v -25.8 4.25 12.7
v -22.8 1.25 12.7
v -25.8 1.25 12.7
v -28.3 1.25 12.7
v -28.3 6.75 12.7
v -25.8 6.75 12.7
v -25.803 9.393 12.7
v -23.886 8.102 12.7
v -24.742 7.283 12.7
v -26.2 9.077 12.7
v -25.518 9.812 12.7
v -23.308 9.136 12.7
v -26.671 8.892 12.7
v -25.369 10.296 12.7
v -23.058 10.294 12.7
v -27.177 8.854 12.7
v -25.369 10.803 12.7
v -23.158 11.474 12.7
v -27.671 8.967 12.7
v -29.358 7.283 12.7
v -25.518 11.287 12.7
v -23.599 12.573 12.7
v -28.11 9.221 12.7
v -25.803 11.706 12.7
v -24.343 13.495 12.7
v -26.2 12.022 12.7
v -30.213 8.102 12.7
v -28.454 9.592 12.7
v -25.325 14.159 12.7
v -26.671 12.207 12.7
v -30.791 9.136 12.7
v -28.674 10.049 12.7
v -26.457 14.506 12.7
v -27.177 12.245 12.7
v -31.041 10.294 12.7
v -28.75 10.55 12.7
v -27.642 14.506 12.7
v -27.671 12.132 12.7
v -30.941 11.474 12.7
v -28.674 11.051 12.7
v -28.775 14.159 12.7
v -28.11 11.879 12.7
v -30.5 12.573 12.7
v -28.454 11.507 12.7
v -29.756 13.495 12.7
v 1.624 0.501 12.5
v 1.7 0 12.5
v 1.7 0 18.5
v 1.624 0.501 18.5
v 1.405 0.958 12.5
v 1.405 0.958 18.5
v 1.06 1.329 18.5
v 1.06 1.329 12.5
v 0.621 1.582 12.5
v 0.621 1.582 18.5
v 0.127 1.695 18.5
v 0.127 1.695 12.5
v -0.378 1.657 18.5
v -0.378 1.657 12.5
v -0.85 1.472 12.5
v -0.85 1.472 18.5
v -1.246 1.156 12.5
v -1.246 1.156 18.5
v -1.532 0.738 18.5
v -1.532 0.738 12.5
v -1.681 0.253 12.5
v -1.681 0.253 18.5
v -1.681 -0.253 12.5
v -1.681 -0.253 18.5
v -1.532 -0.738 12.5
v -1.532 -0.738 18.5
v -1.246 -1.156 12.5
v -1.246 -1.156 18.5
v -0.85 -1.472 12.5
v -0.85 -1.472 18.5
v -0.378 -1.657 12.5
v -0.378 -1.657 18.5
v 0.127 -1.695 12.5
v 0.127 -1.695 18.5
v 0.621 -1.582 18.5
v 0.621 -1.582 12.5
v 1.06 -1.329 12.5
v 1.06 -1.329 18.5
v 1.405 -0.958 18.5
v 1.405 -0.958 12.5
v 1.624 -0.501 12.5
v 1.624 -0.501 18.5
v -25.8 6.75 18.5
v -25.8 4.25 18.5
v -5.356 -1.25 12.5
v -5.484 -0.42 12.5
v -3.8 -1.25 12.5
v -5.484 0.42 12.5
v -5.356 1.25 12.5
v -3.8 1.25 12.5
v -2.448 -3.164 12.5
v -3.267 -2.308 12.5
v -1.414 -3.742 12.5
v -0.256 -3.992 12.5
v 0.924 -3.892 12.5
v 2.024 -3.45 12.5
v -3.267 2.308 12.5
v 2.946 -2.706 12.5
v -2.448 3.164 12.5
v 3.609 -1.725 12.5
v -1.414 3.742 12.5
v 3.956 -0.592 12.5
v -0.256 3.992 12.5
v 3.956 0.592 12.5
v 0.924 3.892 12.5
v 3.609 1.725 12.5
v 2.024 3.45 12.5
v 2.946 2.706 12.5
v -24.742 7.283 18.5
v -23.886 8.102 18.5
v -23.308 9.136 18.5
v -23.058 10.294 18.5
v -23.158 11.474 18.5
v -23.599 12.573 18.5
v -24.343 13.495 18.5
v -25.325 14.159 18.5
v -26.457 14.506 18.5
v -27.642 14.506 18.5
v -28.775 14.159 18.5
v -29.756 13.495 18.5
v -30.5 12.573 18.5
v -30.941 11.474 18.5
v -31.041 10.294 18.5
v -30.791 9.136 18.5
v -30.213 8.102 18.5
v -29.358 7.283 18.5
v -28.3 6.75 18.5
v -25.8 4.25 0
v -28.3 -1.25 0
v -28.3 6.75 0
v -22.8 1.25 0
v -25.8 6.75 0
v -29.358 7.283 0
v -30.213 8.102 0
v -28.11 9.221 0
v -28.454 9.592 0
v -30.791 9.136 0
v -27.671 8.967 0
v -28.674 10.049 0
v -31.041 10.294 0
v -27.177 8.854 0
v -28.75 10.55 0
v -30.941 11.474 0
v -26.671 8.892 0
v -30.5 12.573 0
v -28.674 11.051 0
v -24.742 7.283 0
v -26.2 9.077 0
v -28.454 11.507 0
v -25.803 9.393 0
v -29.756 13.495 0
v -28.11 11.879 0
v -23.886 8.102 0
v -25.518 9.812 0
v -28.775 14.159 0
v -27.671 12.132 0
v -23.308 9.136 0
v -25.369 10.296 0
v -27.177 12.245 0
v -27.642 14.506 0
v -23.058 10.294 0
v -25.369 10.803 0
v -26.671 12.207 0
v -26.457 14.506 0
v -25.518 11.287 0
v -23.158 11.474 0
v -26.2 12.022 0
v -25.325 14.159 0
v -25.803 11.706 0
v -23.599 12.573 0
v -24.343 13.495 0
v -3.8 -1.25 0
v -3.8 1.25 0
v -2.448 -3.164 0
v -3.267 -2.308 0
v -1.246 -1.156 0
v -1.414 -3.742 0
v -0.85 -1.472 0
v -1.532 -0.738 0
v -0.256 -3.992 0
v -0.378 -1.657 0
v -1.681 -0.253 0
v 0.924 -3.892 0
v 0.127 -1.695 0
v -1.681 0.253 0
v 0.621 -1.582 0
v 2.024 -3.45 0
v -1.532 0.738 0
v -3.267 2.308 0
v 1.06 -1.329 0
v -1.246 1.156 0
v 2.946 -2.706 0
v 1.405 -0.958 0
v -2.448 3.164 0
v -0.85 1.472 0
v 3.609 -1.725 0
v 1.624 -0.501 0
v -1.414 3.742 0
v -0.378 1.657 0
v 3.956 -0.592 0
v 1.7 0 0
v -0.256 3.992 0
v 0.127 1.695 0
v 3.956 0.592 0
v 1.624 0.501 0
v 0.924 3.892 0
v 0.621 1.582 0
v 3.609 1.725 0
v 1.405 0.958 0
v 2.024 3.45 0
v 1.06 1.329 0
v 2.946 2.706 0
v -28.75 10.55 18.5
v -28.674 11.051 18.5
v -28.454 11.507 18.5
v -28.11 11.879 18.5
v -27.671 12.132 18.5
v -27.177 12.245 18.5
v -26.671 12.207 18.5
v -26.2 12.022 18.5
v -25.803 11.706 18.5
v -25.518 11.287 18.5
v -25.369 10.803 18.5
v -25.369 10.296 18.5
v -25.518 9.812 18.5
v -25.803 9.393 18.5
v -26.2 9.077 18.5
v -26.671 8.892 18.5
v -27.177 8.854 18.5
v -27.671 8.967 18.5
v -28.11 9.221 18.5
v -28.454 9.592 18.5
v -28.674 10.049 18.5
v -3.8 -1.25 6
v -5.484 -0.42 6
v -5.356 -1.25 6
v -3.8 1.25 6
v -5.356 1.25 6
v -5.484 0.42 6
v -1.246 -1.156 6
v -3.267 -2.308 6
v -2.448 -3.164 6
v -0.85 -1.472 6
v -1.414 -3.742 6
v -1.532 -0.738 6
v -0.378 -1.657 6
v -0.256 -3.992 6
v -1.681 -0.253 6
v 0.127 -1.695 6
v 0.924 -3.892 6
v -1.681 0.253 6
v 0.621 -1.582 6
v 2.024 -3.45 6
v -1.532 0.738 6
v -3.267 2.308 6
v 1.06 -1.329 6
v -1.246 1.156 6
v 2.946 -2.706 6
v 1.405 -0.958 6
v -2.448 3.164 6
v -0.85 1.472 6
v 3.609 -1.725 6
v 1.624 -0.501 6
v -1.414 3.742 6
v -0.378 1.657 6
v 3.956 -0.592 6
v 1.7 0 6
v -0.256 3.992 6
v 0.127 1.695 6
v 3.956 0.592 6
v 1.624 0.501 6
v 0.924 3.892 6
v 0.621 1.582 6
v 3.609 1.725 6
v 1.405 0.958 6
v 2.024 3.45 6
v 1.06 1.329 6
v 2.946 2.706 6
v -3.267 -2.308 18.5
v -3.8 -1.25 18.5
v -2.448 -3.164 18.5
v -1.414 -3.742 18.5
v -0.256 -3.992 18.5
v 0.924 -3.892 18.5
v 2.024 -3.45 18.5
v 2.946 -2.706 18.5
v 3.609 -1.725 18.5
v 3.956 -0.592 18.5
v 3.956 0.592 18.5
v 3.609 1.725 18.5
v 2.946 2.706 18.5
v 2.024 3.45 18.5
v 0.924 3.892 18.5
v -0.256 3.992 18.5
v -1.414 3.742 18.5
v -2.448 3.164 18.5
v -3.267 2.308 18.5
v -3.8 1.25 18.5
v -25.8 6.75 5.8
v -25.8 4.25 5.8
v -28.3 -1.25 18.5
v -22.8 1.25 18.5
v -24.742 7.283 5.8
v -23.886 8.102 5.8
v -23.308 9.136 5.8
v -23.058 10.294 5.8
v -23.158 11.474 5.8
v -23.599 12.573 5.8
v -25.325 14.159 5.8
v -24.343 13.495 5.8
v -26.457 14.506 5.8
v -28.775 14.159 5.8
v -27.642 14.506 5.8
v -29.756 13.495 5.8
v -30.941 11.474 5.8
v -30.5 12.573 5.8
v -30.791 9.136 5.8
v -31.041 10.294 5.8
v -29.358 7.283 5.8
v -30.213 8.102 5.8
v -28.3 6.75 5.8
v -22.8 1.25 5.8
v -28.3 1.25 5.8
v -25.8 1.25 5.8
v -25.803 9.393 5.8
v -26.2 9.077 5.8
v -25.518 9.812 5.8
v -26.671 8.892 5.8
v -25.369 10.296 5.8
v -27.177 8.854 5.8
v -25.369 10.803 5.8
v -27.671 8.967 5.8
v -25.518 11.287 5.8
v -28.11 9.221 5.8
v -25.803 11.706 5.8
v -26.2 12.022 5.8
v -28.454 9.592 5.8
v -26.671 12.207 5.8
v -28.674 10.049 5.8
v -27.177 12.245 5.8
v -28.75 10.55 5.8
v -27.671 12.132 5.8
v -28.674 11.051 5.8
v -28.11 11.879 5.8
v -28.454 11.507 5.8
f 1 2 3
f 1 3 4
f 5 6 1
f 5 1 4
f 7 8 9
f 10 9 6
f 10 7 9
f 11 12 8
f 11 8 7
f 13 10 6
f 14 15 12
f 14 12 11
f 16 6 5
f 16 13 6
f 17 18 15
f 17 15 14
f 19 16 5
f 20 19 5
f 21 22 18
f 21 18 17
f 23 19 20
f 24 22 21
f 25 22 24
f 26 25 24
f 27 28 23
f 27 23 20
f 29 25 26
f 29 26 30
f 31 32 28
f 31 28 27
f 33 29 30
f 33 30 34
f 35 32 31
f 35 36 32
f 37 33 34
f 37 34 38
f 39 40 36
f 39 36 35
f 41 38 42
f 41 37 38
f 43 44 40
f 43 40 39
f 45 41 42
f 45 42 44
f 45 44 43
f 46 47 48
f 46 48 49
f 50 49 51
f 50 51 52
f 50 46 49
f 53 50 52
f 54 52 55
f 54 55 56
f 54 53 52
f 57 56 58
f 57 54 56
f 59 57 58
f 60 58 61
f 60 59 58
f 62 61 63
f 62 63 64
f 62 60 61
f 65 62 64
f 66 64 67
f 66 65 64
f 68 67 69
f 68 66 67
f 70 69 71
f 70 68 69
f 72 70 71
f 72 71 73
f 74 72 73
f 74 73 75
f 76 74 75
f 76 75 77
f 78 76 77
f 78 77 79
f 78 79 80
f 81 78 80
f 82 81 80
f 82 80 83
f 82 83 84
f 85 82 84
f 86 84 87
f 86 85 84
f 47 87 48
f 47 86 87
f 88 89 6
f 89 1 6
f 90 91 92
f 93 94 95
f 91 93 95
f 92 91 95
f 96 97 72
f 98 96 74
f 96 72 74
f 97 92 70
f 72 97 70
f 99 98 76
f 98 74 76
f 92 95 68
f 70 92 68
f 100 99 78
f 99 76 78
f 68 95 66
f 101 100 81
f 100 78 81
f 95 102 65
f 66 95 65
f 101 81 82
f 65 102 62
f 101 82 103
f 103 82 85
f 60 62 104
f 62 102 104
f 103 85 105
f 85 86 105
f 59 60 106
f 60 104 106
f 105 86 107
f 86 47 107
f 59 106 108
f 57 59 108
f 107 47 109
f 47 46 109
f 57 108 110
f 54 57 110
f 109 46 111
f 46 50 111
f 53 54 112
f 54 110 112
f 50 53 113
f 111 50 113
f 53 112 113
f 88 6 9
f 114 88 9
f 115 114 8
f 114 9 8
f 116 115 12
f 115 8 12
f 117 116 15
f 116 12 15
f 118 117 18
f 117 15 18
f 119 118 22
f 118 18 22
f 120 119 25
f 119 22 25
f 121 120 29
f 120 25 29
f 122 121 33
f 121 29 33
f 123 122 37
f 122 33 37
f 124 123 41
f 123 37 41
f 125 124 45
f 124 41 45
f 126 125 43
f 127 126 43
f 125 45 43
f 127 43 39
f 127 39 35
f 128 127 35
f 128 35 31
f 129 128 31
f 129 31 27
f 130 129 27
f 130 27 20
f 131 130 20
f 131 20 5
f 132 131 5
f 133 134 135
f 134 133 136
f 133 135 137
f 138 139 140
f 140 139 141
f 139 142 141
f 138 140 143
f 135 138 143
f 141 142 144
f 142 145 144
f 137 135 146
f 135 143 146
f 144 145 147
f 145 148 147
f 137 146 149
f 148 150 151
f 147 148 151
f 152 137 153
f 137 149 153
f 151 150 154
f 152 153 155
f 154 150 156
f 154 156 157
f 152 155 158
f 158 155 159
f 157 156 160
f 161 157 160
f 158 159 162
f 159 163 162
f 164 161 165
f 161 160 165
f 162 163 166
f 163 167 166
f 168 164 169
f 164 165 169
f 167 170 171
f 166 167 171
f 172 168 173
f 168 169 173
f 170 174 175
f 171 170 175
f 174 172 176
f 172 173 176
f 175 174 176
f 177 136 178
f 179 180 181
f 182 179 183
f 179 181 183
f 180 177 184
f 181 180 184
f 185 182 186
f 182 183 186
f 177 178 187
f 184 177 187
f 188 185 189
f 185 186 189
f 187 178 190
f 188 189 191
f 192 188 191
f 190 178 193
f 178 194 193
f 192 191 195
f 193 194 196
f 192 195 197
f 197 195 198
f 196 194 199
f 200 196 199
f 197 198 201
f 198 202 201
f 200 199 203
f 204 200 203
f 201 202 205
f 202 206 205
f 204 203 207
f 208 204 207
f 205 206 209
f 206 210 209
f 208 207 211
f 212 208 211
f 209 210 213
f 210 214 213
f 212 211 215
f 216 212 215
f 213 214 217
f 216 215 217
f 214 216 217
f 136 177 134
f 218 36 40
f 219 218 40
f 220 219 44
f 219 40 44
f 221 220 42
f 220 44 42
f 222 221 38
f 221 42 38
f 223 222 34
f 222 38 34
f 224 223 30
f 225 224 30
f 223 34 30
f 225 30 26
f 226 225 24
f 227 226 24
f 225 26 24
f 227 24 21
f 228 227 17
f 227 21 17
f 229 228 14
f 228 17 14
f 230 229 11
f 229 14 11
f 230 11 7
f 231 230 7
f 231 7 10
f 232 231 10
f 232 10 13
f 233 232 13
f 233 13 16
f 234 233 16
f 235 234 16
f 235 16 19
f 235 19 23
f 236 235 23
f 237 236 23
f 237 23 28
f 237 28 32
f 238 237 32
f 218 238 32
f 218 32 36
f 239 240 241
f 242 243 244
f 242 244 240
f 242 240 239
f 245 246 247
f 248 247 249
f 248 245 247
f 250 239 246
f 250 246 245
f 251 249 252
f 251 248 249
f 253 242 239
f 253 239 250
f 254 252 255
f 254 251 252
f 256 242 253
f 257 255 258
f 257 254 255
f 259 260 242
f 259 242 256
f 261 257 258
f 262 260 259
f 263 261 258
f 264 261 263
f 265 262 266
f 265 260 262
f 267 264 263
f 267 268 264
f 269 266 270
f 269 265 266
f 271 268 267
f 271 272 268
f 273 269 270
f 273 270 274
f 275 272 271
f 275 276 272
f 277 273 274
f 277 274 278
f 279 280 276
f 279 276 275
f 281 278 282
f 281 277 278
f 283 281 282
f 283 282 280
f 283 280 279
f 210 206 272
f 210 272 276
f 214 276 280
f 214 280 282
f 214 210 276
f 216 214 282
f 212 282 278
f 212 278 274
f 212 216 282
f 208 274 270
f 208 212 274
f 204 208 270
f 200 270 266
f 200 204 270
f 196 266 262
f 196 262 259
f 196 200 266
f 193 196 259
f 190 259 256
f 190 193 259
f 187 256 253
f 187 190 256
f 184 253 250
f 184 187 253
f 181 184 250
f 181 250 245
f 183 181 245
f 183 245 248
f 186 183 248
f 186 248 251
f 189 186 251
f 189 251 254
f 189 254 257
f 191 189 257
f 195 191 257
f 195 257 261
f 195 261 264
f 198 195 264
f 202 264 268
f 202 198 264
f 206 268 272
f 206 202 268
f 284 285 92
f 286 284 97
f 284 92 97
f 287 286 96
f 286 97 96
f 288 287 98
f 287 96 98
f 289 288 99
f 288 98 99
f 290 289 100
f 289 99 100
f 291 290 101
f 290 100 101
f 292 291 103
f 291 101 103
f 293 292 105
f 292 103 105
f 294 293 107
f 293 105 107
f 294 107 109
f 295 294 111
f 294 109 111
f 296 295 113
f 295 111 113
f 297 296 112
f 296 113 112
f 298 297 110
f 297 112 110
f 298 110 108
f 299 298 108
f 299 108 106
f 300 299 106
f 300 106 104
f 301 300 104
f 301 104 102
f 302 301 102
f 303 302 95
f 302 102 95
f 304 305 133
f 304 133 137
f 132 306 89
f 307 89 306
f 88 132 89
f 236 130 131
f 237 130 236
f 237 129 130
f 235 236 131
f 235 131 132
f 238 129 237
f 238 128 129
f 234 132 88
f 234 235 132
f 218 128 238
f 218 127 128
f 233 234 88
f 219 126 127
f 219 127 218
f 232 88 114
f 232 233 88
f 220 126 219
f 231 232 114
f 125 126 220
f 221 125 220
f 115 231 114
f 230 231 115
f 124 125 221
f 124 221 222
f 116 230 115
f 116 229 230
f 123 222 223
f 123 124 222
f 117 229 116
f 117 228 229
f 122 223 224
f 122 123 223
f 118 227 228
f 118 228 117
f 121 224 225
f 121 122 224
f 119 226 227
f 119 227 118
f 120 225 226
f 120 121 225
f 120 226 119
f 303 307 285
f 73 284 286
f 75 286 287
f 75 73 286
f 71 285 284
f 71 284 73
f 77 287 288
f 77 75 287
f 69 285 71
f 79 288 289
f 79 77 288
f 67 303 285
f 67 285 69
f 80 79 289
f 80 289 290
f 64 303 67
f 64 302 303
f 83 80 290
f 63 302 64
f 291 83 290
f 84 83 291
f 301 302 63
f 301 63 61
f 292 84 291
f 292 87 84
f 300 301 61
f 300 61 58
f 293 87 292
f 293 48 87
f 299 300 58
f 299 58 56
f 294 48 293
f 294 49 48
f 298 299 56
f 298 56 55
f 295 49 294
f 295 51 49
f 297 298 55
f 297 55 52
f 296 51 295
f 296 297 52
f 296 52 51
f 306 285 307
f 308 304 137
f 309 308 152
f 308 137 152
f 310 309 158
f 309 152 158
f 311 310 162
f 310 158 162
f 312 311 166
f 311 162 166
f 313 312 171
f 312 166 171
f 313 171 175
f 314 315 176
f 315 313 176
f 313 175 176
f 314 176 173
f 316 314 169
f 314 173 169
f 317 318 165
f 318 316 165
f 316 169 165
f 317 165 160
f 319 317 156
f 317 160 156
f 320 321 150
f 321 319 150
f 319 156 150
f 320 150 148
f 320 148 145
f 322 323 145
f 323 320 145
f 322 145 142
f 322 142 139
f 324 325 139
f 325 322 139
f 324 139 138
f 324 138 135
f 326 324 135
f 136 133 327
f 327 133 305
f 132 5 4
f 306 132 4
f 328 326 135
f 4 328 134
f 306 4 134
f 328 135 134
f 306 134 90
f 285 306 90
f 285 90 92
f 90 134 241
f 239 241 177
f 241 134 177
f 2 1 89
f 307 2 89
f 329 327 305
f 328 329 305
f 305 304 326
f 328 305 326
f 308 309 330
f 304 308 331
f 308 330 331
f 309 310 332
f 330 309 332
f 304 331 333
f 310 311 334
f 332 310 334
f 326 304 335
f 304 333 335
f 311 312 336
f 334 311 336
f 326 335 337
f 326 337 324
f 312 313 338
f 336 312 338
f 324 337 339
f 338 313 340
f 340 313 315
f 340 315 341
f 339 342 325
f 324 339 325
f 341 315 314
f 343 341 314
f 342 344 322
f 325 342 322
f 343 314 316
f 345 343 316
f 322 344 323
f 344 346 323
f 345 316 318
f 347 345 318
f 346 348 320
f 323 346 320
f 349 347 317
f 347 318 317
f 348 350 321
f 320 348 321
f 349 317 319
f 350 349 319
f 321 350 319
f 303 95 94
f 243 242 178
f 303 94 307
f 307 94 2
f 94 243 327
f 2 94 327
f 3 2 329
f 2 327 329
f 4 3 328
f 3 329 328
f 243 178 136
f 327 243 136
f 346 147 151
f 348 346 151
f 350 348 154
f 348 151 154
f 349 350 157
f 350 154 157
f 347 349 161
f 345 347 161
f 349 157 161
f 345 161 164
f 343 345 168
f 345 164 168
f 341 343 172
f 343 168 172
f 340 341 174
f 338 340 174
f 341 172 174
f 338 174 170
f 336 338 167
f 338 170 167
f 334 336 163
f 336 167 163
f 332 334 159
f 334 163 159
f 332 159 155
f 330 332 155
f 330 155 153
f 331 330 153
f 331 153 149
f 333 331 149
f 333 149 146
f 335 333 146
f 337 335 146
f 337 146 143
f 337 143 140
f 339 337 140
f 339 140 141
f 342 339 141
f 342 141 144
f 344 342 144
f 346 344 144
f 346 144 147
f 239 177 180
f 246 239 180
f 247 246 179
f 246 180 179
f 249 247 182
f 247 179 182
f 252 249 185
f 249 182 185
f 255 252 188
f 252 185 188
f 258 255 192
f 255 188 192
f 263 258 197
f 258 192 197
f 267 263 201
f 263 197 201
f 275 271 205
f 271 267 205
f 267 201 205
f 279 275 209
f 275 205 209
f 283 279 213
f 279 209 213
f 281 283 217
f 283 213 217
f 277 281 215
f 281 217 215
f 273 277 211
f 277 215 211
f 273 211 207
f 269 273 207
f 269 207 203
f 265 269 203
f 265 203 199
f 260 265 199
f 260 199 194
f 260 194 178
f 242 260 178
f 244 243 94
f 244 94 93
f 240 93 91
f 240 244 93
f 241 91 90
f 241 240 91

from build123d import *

# Parameters (mm, degrees)
SKETCH_2_R             = 4
SKETCH_2_R_2           = 1.7
EXTRUDE_1_DEPTH        = 6
PATTERN_LINEAR_1_COUNT = 2
PATTERN_LINEAR_1_PITCH = 12.5
SKETCH_3_R             = 1.7
EXTRUDE_2_DEPTH        = 18.5
SKETCH_4_R             = 5.5
CUT_EXTRUDE_1_DEPTH    = 6.5
SKETCH_9_W             = 14.956687691
SKETCH_9_H             = 17.867271405
CUT_EXTRUDE_3_DEPTH    = 3.45
CHAMFER_1_SIZE         = 3


with BuildPart() as part:
    # Эскиз2 → Бобышка-Вытянуть1 (new body)
    with BuildSketch(Plane.XY):
        Circle(SKETCH_2_R)
        Circle(SKETCH_2_R_2, mode=Mode.SUBTRACT)
    extrude(amount=EXTRUDE_1_DEPTH)


with BuildPart() as pattern_linear_1_1:
    # Линейный массив1: pattern copy
    add(part.part.moved(Location(Vector(0, 0, 1) * (1 * PATTERN_LINEAR_1_PITCH))))


with BuildPart() as part_1:
    add(part.part)

    add(pattern_linear_1_1.part)  # Бобышка-Вытянуть2 merges Линейный массив1_1
    # Эскиз3 → Бобышка-Вытянуть2 (add)
    with BuildSketch(Plane(origin=(0, 0, 0), x_dir=(-1, 0, 0), z_dir=(0, 0, -1))):
        with BuildLine():
            Line((3.799671038, 1.25), (25.799671038, 1.25))
            Line((25.799671038, 1.25), (25.799671038, 6.75))
            ThreePointArc((25.799671038, 6.75), (27.049671038, 14.549671038), (28.299671038, 6.75))
            Line((28.299671038, 6.75), (28.299671038, -1.25))
            Line((28.299671038, -1.25), (25.799671038, -1.25))
            Line((25.799671038, -1.25), (3.799671038, -1.25))
            Line((3.799671038, -1.25), (3.799671038, 1.25))
        make_face()
        with Locations((27.049671038, 10.549671038)):
            Circle(SKETCH_3_R, mode=Mode.SUBTRACT)
    extrude(amount=-EXTRUDE_2_DEPTH)

    # Эскиз4 → Вырез-Вытянуть1 (cut)
    with BuildSketch(Plane.XY.offset(6)):
        Circle(SKETCH_4_R)
    extrude(amount=CUT_EXTRUDE_1_DEPTH, mode=Mode.SUBTRACT)

    # Эскиз9 → Вырез-Вытянуть3 (cut)
    with BuildSketch(Plane(origin=(0, 0, 9.25), x_dir=(-1, 0, 0), z_dir=(0, 0, -1))):
        with Locations((27.795829792, 10.183635703)):
            Rectangle(SKETCH_9_W, SKETCH_9_H)
    cut_extrude_3 = extrude(amount=CUT_EXTRUDE_3_DEPTH, mode=Mode.SUBTRACT)

    # Зеркальное отражение1: Вырез-Вытянуть3 across plane
    add(cut_extrude_3.mirror(Plane(origin=(0, 0, 9.25), x_dir=(1, 0, 0), z_dir=(0, 0, -1))), mode=Mode.SUBTRACT)

    # Фаска1
    chamfer_1_edges = [part_1.edges().sort_by_distance(p)[0] for p in [
        (-25.799671038, 1.25, 15.6),
        (-25.799671038, 1.25, 2.9),
    ]]
    chamfer(chamfer_1_edges, length=CHAMFER_1_SIZE)


solid = part_1.part
